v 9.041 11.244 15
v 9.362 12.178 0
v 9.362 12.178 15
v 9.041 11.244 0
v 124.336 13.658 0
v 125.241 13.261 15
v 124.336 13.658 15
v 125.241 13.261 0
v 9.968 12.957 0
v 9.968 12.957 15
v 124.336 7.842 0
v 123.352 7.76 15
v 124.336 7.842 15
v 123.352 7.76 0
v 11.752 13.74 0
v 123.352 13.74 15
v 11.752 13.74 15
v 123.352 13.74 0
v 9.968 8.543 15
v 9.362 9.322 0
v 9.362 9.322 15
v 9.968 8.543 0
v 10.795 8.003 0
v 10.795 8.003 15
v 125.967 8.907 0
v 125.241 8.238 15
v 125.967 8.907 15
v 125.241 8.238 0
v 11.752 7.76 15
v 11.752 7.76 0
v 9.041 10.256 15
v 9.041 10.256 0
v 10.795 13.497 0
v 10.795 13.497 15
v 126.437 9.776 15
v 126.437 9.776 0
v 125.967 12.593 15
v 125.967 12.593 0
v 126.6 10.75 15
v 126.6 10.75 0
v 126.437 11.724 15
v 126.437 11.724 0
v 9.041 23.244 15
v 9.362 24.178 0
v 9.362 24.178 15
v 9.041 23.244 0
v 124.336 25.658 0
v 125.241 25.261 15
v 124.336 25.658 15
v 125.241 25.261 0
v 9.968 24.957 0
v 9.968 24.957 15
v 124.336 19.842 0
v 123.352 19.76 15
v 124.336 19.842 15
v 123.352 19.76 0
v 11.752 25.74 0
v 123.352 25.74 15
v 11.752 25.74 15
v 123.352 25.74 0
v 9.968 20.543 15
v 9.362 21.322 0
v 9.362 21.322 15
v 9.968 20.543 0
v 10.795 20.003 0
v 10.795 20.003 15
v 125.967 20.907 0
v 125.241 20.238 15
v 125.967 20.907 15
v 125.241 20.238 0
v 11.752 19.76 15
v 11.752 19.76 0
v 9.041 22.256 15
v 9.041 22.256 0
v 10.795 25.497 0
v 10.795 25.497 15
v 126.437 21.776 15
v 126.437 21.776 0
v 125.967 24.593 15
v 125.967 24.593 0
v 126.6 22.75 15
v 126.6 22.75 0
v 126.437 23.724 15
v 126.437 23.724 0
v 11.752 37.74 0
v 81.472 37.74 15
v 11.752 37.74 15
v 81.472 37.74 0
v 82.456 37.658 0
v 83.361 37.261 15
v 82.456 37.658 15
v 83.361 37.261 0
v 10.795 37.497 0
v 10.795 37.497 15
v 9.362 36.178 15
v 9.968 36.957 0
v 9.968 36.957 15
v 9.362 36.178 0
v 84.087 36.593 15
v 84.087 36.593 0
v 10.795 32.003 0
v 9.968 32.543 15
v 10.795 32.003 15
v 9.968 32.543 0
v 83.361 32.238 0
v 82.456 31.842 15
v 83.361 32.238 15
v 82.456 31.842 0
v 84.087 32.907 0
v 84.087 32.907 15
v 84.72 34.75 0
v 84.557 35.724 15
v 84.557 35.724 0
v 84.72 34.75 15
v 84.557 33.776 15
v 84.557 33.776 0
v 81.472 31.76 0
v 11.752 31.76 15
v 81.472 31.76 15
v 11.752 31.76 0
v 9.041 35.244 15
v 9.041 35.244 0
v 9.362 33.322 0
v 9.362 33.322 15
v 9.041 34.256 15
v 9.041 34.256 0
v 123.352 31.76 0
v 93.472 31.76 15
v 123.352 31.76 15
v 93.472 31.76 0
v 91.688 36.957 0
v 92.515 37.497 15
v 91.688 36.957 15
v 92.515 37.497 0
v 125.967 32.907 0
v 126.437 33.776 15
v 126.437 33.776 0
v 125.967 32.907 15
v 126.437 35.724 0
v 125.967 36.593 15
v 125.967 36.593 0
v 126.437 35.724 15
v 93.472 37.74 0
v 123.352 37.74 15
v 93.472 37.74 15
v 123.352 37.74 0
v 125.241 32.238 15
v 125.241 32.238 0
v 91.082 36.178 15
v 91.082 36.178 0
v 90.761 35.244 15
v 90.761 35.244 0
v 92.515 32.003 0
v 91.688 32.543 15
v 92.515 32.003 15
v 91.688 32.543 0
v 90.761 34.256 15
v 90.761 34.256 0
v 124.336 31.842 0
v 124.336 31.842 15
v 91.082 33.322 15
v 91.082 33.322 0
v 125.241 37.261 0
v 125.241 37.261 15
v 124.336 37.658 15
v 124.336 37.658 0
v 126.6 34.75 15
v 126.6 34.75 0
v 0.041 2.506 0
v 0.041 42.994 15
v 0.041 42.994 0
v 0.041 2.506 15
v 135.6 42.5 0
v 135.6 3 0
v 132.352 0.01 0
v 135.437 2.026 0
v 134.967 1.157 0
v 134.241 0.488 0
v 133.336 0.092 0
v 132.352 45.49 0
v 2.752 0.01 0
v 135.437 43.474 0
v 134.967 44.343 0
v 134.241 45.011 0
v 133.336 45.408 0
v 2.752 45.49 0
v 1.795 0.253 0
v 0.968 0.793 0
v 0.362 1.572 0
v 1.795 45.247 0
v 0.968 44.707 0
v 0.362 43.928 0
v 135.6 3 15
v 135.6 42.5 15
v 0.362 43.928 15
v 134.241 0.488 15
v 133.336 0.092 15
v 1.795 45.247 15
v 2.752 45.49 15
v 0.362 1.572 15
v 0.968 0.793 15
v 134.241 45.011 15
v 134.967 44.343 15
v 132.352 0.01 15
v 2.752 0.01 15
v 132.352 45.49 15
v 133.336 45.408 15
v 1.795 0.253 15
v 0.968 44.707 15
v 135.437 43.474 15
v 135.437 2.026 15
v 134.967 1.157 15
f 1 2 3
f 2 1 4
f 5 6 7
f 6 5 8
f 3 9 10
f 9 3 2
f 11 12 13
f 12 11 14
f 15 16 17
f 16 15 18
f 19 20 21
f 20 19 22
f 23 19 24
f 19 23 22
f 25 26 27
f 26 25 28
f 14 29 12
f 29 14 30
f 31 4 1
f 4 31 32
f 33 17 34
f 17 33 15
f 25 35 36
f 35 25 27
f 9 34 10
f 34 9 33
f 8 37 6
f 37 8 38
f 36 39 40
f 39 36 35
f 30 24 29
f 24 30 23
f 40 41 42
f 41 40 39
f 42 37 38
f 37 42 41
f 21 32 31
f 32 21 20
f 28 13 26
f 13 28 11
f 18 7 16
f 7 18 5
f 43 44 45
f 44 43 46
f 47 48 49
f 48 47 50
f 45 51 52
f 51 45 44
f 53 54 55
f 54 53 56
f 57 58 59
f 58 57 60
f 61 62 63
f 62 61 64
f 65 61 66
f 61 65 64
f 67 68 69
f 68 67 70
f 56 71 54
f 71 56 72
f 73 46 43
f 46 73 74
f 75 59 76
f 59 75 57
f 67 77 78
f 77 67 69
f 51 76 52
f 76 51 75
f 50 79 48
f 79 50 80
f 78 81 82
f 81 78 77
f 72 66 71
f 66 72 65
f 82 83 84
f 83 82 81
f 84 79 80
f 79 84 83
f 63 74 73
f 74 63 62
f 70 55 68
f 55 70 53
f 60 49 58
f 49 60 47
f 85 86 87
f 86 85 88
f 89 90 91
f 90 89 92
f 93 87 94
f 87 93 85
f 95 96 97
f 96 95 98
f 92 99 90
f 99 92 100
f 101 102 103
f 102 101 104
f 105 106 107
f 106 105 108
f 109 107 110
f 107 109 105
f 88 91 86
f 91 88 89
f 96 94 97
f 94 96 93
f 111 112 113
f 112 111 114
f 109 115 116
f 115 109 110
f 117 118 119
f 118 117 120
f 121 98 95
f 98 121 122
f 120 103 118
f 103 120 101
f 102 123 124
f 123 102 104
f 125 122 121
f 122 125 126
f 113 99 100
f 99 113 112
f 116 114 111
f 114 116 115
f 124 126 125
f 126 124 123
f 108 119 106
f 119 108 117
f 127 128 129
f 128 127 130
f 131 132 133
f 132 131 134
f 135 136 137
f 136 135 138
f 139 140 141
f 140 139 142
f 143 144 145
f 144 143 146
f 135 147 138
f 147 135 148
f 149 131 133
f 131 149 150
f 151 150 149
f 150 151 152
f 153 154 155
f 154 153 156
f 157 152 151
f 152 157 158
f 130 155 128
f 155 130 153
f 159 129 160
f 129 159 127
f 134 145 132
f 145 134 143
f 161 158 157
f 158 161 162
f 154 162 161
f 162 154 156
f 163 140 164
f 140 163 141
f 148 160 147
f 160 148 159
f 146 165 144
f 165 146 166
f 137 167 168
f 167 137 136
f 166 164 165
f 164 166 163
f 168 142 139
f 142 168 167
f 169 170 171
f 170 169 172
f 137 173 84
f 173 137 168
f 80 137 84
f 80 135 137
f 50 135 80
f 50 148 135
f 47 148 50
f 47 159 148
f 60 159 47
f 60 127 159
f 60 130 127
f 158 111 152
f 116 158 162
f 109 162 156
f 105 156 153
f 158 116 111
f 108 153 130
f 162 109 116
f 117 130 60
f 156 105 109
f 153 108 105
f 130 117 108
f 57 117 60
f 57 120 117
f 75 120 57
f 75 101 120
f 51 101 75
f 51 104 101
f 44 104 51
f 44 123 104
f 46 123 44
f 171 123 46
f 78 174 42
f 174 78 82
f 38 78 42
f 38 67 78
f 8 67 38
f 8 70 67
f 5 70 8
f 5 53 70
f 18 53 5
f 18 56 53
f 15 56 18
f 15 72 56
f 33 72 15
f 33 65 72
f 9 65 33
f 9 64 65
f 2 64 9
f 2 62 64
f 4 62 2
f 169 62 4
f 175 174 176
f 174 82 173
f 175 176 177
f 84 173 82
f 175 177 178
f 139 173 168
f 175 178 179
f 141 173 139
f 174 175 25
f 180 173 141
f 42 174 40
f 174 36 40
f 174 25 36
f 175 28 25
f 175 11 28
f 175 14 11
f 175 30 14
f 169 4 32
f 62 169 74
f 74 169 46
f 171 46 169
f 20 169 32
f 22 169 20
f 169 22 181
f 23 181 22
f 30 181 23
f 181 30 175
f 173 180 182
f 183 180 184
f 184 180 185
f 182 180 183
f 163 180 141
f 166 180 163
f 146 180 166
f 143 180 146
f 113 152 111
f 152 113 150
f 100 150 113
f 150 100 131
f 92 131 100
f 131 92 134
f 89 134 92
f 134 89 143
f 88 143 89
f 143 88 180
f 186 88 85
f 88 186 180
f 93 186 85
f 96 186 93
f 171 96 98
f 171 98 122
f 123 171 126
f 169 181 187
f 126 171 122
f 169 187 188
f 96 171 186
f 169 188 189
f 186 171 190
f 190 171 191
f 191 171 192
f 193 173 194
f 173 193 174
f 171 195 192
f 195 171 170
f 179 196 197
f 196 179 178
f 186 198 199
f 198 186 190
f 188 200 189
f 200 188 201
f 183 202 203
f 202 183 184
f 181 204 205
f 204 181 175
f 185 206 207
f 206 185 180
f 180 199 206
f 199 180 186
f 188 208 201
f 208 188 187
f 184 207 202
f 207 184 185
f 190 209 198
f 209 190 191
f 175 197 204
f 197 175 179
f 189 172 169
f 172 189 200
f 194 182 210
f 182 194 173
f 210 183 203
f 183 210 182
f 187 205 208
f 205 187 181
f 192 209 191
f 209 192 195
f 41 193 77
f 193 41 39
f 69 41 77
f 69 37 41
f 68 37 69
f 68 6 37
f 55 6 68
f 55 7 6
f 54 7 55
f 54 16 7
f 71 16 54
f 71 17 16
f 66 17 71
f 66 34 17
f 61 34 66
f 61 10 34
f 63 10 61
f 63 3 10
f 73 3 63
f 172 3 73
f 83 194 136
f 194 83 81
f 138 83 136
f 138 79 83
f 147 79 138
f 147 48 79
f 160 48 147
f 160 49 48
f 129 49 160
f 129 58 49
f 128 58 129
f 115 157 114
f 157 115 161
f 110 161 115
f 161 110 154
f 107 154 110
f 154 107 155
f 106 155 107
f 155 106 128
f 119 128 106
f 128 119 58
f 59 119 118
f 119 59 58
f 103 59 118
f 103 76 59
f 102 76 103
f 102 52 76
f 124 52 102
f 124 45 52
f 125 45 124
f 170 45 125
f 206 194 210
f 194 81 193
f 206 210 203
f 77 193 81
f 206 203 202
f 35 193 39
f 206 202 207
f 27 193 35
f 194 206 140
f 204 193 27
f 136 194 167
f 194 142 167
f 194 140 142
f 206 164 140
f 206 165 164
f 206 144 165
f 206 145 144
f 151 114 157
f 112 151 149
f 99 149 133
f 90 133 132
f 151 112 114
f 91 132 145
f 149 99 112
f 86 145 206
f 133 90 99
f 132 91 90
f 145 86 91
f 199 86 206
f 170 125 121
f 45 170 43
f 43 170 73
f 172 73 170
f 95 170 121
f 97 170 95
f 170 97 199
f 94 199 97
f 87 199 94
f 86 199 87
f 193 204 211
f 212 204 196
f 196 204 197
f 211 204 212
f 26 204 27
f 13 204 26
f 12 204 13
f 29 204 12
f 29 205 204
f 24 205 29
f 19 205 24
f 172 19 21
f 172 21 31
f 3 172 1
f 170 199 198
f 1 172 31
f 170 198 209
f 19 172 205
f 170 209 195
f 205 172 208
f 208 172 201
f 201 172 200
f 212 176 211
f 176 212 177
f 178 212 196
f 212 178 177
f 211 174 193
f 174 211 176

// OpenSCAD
$fa = 1;  // minimal angle, default 12, minimal value 0.01
$fs = 1;  // minimal size of a fragment, default 2, minimal 0.01
// number of fragments, when fn > 0, fa and fs are ignored.
// fn > 100 not recommended. fn < 50 advisable for performance.
$fn = 0;


x = 135.6;
y = 45.5;
z = 15; 
E = 1;

r = 3;
d = r * 2;

X = 12;
Y = (y - 5*d)/2;

l1 = (x - 3 * X) * 0.7;
l2 = (x - 3 * X) * 0.3;

module corner(h=z){
    cylinder(r=r, h=h, center=false);
}

module HoleCorner(){
    translate([0, 0, -E]) corner(h=z + 2 * E);
}

module main(){
    translate([r, r, 0]) hull() {
        corner();
        translate([x-d,0,0]) corner();
        translate([0,y-d,0]) corner();
        translate([x-d,y-d,0]) corner();
    }
}

module hole(l=x - 2 * X) {
    translate([X,r+Y,0]) hull() {
        HoleCorner();
        translate([l,0,0]) HoleCorner();
    }
}

module holes() {
    hole();
    translate([0,2*d,0]) hole();
    translate([0,4*d,0]) hole(l=l1);
    translate([l1+X,4*d,0]) hole(l=l2);
}

difference() {
    main();
    holes();
}
